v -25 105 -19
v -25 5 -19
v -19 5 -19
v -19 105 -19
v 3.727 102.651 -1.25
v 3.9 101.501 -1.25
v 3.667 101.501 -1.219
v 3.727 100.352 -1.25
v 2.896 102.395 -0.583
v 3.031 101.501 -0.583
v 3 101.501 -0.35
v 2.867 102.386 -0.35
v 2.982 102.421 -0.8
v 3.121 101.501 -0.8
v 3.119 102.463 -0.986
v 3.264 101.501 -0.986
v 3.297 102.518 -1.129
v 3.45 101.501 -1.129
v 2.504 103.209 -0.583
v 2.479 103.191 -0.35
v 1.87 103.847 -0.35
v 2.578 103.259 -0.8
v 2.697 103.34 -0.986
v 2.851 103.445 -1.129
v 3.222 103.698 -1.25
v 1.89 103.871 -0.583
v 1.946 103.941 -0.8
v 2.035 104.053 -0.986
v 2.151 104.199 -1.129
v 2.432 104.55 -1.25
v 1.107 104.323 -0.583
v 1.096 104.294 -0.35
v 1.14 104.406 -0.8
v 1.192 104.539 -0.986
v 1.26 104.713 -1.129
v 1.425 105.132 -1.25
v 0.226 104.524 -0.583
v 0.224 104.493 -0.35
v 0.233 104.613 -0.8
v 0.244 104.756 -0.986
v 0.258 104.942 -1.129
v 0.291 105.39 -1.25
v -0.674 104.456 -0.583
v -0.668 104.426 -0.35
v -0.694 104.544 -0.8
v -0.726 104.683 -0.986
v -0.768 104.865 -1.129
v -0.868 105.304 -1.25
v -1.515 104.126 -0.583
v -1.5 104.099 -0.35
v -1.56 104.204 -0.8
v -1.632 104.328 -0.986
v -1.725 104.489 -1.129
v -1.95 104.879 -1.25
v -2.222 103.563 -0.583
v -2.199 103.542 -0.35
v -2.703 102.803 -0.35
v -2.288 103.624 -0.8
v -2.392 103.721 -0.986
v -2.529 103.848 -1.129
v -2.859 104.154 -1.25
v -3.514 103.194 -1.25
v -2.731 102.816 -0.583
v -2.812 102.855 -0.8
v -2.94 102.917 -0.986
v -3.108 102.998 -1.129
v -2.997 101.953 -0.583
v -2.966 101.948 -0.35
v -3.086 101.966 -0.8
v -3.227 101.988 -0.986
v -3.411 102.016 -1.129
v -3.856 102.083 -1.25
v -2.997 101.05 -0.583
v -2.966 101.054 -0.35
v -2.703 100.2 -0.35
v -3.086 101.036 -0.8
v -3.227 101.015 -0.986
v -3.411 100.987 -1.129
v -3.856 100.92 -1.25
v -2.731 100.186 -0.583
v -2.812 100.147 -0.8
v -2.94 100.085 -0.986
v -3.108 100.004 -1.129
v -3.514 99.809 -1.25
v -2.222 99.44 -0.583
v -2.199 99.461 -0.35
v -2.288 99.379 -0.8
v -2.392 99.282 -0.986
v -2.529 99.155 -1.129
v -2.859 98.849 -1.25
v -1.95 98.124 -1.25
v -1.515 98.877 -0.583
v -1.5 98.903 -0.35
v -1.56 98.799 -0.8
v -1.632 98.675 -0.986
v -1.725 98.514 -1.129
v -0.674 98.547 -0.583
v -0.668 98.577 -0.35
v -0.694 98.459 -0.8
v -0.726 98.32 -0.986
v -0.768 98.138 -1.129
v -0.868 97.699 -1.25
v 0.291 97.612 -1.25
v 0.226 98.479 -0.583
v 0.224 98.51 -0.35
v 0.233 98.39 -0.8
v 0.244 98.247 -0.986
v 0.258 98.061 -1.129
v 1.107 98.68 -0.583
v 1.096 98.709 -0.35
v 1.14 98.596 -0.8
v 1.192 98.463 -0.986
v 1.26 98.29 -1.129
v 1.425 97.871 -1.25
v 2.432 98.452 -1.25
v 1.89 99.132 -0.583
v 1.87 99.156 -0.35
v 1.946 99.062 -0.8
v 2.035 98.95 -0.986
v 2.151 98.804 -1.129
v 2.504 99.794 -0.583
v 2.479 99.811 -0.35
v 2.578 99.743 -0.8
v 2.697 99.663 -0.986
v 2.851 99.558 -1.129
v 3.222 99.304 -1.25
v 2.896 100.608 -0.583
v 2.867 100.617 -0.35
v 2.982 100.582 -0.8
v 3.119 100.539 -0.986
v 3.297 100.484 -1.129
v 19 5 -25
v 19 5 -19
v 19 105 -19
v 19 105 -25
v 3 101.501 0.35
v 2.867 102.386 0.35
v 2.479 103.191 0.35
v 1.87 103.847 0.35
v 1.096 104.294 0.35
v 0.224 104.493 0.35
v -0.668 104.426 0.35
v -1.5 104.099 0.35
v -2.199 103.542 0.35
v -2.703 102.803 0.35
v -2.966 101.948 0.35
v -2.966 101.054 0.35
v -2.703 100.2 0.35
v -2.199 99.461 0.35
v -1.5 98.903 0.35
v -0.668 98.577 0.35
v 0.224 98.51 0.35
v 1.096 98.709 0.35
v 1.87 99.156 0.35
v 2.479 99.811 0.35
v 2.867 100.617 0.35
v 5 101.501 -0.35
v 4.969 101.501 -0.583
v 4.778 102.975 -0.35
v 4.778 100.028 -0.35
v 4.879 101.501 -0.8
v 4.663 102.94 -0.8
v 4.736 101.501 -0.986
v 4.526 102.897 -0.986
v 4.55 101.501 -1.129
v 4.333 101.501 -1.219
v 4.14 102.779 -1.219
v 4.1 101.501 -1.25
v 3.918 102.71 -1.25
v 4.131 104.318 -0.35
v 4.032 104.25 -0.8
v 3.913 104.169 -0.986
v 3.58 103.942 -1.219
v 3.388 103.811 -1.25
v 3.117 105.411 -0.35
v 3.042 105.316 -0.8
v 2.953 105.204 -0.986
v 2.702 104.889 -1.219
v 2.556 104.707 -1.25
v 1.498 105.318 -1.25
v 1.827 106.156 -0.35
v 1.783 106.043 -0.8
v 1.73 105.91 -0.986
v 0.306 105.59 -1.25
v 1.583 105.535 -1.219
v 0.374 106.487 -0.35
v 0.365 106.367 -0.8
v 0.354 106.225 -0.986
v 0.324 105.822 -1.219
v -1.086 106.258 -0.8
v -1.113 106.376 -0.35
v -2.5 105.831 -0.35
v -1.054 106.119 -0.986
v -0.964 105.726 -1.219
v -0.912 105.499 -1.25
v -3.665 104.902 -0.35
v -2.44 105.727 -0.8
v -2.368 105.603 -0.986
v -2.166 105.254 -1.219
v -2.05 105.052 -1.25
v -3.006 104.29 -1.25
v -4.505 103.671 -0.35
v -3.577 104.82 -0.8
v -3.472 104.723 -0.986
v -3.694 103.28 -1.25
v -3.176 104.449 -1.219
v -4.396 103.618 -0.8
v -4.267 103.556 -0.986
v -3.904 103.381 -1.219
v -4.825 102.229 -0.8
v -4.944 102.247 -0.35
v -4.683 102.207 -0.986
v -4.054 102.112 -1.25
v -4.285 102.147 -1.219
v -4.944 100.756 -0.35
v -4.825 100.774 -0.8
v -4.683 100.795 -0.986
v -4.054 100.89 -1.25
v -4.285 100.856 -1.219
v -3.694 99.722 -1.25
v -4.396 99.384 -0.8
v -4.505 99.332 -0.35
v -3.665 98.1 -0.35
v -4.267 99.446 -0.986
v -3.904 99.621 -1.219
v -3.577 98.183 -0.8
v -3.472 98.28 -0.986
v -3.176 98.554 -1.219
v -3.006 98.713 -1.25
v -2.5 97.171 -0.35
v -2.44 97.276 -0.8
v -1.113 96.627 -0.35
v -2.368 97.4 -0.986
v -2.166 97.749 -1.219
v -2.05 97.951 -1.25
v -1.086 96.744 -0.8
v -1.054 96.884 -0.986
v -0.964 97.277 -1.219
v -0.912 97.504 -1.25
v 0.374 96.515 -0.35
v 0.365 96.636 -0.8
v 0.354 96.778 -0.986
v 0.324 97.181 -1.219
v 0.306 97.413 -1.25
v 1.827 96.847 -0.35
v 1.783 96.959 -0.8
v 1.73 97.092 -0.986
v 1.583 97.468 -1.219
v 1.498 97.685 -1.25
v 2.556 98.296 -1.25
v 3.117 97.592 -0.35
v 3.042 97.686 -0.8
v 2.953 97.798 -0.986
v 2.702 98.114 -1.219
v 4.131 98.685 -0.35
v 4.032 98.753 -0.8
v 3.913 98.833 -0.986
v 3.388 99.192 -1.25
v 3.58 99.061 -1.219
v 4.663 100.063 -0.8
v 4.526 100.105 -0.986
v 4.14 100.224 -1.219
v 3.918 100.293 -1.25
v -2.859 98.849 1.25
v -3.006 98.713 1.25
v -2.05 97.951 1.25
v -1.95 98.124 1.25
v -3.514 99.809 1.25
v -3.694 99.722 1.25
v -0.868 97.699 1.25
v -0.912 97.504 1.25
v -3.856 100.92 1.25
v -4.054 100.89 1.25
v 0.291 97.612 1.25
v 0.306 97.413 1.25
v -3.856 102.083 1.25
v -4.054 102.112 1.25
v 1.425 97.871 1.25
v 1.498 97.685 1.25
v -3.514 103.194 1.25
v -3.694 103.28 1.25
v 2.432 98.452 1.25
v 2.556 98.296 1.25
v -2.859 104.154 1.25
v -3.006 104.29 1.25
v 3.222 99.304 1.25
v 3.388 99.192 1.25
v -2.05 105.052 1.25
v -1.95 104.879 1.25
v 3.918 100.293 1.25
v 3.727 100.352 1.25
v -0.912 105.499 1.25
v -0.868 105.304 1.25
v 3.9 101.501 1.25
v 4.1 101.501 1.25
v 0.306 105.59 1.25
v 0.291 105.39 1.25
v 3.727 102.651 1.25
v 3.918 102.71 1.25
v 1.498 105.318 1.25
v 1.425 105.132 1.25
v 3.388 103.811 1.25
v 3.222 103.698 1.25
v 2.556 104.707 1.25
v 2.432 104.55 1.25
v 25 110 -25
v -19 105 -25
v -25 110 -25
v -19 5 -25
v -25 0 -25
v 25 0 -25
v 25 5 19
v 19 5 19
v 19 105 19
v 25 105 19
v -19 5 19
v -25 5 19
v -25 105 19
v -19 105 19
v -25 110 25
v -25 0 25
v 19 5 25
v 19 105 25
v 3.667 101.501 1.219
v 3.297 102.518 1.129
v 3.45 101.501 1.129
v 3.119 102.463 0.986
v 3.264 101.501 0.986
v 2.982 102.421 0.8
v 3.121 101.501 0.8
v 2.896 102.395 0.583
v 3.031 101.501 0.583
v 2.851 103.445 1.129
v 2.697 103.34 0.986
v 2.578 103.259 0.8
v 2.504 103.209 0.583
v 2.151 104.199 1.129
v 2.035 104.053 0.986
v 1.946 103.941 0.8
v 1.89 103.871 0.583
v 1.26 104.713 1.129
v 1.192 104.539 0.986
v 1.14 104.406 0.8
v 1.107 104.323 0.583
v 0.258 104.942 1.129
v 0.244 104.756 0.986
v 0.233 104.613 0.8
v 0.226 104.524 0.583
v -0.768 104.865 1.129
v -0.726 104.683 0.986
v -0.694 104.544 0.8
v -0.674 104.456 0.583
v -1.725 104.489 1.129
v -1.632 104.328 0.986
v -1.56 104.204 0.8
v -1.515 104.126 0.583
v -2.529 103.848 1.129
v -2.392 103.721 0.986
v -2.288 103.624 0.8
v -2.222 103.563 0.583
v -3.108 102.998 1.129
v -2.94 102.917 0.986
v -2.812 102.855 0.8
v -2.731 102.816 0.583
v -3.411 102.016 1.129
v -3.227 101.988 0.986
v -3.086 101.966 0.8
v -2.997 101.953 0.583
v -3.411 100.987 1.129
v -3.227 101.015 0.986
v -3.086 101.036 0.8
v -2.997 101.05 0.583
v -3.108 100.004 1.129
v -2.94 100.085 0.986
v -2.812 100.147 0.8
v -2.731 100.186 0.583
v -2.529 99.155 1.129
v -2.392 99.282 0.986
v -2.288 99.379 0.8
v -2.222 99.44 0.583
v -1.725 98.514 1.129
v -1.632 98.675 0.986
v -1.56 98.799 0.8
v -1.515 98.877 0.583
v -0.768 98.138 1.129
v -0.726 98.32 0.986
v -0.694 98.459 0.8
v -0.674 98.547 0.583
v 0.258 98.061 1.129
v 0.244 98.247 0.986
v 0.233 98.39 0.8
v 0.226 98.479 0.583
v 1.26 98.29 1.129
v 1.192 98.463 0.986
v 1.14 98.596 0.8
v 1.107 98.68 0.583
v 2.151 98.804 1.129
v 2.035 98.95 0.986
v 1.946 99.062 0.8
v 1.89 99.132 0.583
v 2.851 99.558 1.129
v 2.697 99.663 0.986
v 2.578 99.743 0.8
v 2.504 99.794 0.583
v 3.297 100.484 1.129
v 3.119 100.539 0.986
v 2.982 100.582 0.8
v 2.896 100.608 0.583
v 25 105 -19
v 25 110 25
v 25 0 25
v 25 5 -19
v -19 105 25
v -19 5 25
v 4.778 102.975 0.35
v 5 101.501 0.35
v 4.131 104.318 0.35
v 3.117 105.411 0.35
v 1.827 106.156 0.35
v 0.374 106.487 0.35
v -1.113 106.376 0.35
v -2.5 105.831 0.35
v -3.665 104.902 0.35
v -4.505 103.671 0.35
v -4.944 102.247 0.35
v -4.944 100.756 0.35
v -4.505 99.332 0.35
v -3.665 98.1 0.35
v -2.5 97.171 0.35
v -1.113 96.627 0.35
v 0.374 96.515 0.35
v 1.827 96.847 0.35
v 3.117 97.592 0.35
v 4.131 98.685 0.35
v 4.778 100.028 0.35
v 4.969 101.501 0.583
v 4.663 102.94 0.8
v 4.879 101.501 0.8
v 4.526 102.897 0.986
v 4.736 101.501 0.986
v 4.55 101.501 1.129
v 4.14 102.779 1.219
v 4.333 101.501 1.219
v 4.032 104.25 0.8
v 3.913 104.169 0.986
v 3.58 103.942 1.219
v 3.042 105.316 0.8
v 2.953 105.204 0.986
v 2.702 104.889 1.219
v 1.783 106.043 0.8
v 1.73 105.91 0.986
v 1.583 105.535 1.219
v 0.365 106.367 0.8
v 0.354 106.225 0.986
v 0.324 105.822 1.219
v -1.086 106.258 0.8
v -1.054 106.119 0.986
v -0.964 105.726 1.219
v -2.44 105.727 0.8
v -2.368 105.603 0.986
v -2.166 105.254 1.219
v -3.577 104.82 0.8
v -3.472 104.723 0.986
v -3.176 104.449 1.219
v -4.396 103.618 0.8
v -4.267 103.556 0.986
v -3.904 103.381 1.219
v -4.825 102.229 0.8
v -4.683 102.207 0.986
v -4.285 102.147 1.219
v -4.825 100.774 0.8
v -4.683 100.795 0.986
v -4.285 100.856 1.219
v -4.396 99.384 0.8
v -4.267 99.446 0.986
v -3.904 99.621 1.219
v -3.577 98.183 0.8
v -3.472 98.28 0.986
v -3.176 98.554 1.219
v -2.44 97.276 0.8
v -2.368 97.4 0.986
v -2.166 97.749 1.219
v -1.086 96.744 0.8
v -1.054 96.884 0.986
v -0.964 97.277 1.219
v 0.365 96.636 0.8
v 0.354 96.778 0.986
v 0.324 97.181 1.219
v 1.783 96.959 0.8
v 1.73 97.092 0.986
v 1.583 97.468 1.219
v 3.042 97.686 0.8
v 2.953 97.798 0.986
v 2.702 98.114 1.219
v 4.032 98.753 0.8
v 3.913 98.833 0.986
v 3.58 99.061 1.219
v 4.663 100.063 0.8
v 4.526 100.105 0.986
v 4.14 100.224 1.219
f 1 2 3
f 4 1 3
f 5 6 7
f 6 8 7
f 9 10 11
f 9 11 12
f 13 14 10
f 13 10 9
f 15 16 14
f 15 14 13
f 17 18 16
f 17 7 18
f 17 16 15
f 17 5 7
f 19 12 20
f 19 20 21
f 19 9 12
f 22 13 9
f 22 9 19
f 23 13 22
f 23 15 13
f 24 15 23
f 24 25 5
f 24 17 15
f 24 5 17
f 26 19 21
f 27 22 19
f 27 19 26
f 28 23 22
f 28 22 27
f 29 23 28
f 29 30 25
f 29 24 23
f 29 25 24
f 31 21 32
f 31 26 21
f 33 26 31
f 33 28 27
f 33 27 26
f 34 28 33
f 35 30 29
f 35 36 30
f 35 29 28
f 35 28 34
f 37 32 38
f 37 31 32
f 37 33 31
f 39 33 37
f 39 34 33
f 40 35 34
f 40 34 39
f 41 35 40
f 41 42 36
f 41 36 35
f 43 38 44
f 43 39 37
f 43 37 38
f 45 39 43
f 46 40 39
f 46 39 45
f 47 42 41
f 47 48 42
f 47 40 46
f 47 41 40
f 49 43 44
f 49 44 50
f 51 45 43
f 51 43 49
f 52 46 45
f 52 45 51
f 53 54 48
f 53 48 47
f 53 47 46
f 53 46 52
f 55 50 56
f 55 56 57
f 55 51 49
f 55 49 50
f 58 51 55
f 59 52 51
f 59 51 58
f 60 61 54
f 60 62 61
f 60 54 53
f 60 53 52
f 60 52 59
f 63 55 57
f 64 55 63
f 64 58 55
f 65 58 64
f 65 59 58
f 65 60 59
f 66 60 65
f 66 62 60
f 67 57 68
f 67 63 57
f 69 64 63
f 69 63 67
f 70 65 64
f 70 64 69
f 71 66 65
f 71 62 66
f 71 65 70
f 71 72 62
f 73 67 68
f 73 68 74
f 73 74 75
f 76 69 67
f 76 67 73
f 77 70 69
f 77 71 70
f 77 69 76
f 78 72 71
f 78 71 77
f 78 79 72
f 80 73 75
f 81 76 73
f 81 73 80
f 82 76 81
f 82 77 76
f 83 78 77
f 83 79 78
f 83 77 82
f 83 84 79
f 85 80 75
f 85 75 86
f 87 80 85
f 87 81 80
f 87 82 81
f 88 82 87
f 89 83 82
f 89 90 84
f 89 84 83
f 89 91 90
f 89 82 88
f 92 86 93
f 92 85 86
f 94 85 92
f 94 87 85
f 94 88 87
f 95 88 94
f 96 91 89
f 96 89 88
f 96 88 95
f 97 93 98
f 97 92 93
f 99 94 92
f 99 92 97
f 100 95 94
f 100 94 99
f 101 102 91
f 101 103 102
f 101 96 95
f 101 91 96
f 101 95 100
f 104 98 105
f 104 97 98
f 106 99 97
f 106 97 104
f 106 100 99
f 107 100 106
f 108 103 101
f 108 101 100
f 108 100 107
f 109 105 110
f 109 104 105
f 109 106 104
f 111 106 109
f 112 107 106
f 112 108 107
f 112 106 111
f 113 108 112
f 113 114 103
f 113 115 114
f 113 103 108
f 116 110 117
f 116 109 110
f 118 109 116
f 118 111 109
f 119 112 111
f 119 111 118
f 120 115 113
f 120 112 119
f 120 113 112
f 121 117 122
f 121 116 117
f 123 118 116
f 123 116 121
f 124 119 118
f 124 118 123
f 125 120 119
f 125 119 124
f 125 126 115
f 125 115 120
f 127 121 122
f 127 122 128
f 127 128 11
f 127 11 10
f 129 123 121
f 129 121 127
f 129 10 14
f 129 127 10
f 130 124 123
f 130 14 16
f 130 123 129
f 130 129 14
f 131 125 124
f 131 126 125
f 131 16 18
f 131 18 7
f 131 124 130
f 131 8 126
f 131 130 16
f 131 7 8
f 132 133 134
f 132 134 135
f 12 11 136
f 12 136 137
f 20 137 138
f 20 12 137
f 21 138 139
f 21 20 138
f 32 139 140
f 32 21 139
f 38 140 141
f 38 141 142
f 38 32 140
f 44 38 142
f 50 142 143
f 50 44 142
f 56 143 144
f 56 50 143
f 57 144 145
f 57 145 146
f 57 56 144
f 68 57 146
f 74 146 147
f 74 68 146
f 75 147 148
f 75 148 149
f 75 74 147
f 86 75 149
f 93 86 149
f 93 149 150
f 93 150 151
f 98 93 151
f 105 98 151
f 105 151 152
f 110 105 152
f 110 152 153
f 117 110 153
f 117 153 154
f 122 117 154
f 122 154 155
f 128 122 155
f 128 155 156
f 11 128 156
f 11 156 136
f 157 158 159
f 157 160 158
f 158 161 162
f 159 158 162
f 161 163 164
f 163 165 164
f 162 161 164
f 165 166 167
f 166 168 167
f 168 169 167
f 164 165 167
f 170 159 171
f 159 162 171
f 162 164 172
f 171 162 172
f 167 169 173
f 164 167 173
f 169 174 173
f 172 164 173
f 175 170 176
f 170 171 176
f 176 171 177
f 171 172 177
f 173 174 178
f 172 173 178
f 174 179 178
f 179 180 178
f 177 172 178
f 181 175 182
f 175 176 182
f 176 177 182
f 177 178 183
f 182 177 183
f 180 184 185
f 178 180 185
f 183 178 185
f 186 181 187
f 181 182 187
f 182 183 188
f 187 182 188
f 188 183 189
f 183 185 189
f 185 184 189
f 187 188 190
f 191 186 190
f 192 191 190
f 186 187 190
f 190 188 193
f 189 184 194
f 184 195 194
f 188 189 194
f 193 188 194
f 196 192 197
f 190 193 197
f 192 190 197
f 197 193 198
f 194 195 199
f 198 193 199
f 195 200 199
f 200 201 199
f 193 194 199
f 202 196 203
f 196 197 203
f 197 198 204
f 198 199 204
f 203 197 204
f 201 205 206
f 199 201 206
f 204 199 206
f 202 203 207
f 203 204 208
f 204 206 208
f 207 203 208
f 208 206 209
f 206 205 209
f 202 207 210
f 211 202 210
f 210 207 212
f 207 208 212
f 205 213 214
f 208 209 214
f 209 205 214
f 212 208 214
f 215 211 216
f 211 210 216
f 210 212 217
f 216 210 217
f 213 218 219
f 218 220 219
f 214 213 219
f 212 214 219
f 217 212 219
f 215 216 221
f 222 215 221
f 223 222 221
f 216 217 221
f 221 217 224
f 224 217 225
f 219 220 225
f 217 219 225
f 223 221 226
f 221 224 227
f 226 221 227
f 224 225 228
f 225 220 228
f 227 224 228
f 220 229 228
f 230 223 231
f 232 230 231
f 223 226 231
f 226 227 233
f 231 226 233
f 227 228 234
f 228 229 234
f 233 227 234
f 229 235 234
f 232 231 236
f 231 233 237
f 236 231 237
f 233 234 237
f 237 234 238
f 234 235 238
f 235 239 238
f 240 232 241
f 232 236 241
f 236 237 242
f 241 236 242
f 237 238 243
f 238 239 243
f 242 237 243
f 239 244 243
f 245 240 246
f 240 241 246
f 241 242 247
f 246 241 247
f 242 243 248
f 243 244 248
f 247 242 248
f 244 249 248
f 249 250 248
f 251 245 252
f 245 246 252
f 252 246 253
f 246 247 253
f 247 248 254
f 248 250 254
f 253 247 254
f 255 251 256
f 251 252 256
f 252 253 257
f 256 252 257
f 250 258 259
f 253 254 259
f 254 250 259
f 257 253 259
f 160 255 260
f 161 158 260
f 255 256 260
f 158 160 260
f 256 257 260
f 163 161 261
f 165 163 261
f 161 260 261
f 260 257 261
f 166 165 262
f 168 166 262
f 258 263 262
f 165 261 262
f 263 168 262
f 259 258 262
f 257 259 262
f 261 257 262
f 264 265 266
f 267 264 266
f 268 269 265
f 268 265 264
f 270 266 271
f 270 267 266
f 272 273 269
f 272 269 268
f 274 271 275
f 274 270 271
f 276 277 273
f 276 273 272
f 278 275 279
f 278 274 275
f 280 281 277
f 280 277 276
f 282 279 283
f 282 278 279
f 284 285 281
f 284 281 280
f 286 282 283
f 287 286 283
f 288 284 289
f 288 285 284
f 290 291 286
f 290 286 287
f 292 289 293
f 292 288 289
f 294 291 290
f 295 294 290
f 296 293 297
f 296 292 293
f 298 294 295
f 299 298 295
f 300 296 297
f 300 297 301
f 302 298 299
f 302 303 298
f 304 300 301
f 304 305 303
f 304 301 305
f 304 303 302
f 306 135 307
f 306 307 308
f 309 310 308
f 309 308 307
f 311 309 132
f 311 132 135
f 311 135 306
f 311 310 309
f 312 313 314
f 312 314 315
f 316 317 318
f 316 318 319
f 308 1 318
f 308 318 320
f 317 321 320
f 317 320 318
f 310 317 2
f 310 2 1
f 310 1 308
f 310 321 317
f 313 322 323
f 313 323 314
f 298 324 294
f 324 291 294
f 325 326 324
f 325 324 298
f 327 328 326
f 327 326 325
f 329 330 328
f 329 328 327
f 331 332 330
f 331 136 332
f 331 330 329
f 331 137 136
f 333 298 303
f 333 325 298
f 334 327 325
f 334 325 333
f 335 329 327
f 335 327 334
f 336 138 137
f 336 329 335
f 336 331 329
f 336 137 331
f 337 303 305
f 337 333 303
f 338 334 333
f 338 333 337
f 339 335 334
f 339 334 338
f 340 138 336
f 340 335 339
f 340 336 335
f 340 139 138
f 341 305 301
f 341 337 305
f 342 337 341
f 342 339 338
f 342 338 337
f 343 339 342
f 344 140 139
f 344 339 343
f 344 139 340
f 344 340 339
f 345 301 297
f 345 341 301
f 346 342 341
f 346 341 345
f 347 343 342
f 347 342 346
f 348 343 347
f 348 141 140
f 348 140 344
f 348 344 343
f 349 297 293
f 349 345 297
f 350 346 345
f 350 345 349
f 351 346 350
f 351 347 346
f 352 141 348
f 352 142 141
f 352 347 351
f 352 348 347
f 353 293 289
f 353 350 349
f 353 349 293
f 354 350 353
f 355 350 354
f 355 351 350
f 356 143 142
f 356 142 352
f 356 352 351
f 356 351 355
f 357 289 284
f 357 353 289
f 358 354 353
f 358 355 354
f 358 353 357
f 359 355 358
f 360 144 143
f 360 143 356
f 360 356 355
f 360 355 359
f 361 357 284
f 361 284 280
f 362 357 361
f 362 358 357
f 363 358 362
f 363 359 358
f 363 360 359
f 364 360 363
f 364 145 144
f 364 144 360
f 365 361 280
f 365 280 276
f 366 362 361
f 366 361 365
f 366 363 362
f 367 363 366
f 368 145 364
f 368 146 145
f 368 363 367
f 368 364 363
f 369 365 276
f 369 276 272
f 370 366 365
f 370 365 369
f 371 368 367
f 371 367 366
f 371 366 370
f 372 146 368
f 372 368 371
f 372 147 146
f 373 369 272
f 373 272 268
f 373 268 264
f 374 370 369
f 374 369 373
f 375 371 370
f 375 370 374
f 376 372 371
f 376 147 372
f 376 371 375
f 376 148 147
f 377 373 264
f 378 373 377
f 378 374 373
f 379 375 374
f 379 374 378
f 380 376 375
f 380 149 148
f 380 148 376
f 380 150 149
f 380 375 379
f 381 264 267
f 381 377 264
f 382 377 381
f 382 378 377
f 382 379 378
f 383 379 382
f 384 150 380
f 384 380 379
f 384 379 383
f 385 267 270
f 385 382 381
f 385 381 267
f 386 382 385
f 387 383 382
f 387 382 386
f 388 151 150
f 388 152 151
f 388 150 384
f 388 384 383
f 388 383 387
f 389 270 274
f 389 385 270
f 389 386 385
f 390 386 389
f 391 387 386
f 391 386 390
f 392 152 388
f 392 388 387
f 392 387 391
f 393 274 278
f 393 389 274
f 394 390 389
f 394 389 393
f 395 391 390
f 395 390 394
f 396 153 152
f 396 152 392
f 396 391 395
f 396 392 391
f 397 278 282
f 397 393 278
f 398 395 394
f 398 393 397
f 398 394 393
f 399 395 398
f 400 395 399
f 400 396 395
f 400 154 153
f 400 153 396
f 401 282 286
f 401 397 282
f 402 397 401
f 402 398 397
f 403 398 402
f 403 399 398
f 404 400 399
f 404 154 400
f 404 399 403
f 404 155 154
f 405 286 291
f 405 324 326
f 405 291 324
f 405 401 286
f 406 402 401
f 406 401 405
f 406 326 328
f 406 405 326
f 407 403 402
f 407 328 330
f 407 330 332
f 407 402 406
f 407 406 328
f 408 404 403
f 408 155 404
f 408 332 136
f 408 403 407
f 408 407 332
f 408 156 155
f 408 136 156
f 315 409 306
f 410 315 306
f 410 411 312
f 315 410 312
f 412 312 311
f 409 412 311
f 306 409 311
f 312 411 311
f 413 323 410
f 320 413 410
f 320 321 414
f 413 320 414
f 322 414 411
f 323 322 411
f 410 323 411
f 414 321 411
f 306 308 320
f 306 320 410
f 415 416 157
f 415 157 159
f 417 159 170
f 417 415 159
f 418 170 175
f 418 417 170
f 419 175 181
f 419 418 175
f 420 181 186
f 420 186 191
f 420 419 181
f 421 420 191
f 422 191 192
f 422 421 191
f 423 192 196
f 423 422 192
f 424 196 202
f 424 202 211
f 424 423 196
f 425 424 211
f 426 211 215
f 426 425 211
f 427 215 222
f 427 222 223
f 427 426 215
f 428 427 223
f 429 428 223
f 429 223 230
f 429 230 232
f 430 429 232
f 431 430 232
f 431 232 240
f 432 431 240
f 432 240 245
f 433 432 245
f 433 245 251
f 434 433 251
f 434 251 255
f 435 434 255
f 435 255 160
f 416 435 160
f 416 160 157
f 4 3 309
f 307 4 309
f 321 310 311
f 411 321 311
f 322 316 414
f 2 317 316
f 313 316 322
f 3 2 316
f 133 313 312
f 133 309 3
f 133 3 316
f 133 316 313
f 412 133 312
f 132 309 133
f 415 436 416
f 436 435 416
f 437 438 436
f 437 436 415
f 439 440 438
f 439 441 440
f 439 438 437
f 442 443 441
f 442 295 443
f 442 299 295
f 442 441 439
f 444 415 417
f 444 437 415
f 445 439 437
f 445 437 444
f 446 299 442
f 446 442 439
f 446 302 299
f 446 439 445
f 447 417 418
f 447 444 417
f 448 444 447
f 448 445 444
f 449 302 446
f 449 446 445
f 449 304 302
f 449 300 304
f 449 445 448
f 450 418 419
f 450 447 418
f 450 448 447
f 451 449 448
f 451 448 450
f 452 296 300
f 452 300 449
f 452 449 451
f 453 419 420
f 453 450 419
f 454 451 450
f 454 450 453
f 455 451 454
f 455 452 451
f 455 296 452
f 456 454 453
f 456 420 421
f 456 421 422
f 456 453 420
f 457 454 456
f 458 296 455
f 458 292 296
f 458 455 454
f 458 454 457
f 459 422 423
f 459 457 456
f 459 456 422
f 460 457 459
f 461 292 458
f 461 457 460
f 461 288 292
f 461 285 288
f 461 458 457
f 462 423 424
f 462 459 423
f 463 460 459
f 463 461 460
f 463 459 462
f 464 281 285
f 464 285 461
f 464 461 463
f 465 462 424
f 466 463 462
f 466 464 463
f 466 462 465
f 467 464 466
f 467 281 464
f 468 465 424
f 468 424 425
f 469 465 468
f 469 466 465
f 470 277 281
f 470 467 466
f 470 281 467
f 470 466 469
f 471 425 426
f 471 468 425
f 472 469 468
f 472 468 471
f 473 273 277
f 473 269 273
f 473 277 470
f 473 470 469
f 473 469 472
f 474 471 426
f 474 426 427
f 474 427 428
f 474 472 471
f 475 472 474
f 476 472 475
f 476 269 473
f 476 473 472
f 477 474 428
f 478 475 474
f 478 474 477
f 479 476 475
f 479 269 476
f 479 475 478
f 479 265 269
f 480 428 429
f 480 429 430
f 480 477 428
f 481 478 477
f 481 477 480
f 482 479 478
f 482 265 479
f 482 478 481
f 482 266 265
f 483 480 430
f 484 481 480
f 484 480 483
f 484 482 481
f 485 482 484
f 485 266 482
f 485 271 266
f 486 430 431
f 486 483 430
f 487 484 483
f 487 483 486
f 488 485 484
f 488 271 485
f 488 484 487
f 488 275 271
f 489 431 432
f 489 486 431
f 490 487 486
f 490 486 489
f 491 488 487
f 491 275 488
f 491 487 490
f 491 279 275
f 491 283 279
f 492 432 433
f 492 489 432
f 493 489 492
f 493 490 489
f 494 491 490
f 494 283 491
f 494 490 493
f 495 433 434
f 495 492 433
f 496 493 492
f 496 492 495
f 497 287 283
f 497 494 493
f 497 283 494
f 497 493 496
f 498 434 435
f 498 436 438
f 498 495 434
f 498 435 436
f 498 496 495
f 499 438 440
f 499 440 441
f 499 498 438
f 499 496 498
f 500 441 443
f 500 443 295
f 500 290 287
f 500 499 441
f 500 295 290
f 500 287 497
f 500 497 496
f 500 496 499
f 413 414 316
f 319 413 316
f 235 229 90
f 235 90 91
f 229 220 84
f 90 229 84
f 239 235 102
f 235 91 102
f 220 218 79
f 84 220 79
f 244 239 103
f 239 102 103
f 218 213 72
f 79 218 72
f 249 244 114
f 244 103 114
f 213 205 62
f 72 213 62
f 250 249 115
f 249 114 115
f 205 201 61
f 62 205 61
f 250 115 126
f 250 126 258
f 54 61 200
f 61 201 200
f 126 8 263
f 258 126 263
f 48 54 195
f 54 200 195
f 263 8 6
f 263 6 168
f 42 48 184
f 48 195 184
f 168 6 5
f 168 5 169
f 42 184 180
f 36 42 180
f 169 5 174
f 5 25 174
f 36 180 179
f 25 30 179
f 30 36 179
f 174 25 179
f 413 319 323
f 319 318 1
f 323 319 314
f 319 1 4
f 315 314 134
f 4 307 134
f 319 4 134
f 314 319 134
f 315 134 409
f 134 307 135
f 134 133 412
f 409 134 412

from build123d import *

# Parameters (mm, degrees)
SCHIZZO1_W                   = 50
SCHIZZO1_H                   = 50
ESTRUSIONE_ESTRUSIONE1_DEPTH = 5
SCHIZZO2_W                   = 6
SCHIZZO2_H                   = 6
ESTRUSIONE_ESTRUSIONE2_DEPTH = 100
SCHIZZO3_W                   = 50
SCHIZZO3_H                   = 50
ESTRUSIONE_ESTRUSIONE3_DEPTH = 5
SCHIZZO4_R                   = 5
SCHIZZO4_R_2                 = 3
ESTRUSIONE_ESTRUSIONE4_DEPTH = 1.25
RACCORDO1_R                  = 0.9


with BuildPart() as part:
    # Schizzo1 → Estrusione-Estrusione1 (new body)
    with BuildSketch(Plane(origin=(0, 0, 0), x_dir=(1, 0, 0), z_dir=(0, 1, 0))):
        Rectangle(SCHIZZO1_W, SCHIZZO1_H)
    extrude(amount=ESTRUSIONE_ESTRUSIONE1_DEPTH)

    # Schizzo2 → Estrusione-Estrusione2 (add)
    with BuildSketch(Plane(origin=(0, 5, 0), x_dir=(1, 0, 0), z_dir=(0, 1, 0))):
        with Locations((22, 22)):
            Rectangle(SCHIZZO2_W, SCHIZZO2_H)
        with Locations((-22, 22)):
            Rectangle(SCHIZZO2_W, SCHIZZO2_H)
        with Locations((22, -22)):
            Rectangle(SCHIZZO2_W, SCHIZZO2_H)
        with Locations((-22, -22)):
            Rectangle(SCHIZZO2_W, SCHIZZO2_H)
    extrude(amount=ESTRUSIONE_ESTRUSIONE2_DEPTH)

    # Schizzo3 → Estrusione-Estrusione3 (add)
    with BuildSketch(Plane(origin=(0, 105, 0), x_dir=(1, 0, 0), z_dir=(0, 1, 0))):
        Rectangle(SCHIZZO3_W, SCHIZZO3_H)
    extrude(amount=ESTRUSIONE_ESTRUSIONE3_DEPTH)


with BuildPart() as body_2:
    # Schizzo4 → Estrusione-Estrusione4 (new, symmetric)
    with BuildSketch(Plane.XY):
        with Locations((0, 101.50135613)):
            Circle(SCHIZZO4_R)
        with Locations((0, 101.50135613)):
            Circle(SCHIZZO4_R_2, mode=Mode.SUBTRACT)
    extrude(amount=ESTRUSIONE_ESTRUSIONE4_DEPTH, both=True)

    # Raccordo1
    raccordo1_edges = [body_2.edges().sort_by_distance(p)[0] for p in [
        (-5, 101.50135613, -1.25),
        (-5, 101.50135613, 1.25),
        (-3, 101.50135613, -1.25),
        (-3, 101.50135613, 1.25),
    ]]
    fillet(raccordo1_edges, radius=RACCORDO1_R)


solid = Compound([part.part, body_2.part])
